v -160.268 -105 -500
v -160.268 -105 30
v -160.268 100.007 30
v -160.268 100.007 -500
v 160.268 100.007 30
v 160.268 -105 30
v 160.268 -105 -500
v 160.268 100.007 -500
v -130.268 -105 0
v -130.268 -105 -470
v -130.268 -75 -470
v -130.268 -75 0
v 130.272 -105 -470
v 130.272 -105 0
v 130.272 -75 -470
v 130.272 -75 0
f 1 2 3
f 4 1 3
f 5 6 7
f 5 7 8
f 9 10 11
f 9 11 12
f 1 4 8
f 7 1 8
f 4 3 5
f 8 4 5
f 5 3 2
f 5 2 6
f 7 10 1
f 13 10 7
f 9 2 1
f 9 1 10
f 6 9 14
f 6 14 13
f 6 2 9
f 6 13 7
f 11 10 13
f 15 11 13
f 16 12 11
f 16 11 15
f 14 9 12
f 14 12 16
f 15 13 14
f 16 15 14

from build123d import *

# Parameters (mm, degrees)
SKETCH1_W           = 320.53572501
SKETCH1_H           = 205.006558649
BOSS_EXTRUDE1_DEPTH = 530
SKETCH2_W           = 260.54
SKETCH2_H           = 470
CUT_EXTRUDE1_DEPTH  = 30


with BuildPart() as part:
    # Sketch1 → Boss-Extrude1 (new body)
    with BuildSketch(Plane.XY.offset(30)):
        with Locations((0, -2.496720675)):
            Rectangle(SKETCH1_W, SKETCH1_H)
    extrude(amount=-BOSS_EXTRUDE1_DEPTH)

    # Sketch2 → Cut-Extrude1 (cut)
    with BuildSketch(Plane.XZ.offset(105)):
        with Locations((0.002137495, -235)):
            Rectangle(SKETCH2_W, SKETCH2_H)
    extrude(amount=-CUT_EXTRUDE1_DEPTH, mode=Mode.SUBTRACT)


solid = part.part
